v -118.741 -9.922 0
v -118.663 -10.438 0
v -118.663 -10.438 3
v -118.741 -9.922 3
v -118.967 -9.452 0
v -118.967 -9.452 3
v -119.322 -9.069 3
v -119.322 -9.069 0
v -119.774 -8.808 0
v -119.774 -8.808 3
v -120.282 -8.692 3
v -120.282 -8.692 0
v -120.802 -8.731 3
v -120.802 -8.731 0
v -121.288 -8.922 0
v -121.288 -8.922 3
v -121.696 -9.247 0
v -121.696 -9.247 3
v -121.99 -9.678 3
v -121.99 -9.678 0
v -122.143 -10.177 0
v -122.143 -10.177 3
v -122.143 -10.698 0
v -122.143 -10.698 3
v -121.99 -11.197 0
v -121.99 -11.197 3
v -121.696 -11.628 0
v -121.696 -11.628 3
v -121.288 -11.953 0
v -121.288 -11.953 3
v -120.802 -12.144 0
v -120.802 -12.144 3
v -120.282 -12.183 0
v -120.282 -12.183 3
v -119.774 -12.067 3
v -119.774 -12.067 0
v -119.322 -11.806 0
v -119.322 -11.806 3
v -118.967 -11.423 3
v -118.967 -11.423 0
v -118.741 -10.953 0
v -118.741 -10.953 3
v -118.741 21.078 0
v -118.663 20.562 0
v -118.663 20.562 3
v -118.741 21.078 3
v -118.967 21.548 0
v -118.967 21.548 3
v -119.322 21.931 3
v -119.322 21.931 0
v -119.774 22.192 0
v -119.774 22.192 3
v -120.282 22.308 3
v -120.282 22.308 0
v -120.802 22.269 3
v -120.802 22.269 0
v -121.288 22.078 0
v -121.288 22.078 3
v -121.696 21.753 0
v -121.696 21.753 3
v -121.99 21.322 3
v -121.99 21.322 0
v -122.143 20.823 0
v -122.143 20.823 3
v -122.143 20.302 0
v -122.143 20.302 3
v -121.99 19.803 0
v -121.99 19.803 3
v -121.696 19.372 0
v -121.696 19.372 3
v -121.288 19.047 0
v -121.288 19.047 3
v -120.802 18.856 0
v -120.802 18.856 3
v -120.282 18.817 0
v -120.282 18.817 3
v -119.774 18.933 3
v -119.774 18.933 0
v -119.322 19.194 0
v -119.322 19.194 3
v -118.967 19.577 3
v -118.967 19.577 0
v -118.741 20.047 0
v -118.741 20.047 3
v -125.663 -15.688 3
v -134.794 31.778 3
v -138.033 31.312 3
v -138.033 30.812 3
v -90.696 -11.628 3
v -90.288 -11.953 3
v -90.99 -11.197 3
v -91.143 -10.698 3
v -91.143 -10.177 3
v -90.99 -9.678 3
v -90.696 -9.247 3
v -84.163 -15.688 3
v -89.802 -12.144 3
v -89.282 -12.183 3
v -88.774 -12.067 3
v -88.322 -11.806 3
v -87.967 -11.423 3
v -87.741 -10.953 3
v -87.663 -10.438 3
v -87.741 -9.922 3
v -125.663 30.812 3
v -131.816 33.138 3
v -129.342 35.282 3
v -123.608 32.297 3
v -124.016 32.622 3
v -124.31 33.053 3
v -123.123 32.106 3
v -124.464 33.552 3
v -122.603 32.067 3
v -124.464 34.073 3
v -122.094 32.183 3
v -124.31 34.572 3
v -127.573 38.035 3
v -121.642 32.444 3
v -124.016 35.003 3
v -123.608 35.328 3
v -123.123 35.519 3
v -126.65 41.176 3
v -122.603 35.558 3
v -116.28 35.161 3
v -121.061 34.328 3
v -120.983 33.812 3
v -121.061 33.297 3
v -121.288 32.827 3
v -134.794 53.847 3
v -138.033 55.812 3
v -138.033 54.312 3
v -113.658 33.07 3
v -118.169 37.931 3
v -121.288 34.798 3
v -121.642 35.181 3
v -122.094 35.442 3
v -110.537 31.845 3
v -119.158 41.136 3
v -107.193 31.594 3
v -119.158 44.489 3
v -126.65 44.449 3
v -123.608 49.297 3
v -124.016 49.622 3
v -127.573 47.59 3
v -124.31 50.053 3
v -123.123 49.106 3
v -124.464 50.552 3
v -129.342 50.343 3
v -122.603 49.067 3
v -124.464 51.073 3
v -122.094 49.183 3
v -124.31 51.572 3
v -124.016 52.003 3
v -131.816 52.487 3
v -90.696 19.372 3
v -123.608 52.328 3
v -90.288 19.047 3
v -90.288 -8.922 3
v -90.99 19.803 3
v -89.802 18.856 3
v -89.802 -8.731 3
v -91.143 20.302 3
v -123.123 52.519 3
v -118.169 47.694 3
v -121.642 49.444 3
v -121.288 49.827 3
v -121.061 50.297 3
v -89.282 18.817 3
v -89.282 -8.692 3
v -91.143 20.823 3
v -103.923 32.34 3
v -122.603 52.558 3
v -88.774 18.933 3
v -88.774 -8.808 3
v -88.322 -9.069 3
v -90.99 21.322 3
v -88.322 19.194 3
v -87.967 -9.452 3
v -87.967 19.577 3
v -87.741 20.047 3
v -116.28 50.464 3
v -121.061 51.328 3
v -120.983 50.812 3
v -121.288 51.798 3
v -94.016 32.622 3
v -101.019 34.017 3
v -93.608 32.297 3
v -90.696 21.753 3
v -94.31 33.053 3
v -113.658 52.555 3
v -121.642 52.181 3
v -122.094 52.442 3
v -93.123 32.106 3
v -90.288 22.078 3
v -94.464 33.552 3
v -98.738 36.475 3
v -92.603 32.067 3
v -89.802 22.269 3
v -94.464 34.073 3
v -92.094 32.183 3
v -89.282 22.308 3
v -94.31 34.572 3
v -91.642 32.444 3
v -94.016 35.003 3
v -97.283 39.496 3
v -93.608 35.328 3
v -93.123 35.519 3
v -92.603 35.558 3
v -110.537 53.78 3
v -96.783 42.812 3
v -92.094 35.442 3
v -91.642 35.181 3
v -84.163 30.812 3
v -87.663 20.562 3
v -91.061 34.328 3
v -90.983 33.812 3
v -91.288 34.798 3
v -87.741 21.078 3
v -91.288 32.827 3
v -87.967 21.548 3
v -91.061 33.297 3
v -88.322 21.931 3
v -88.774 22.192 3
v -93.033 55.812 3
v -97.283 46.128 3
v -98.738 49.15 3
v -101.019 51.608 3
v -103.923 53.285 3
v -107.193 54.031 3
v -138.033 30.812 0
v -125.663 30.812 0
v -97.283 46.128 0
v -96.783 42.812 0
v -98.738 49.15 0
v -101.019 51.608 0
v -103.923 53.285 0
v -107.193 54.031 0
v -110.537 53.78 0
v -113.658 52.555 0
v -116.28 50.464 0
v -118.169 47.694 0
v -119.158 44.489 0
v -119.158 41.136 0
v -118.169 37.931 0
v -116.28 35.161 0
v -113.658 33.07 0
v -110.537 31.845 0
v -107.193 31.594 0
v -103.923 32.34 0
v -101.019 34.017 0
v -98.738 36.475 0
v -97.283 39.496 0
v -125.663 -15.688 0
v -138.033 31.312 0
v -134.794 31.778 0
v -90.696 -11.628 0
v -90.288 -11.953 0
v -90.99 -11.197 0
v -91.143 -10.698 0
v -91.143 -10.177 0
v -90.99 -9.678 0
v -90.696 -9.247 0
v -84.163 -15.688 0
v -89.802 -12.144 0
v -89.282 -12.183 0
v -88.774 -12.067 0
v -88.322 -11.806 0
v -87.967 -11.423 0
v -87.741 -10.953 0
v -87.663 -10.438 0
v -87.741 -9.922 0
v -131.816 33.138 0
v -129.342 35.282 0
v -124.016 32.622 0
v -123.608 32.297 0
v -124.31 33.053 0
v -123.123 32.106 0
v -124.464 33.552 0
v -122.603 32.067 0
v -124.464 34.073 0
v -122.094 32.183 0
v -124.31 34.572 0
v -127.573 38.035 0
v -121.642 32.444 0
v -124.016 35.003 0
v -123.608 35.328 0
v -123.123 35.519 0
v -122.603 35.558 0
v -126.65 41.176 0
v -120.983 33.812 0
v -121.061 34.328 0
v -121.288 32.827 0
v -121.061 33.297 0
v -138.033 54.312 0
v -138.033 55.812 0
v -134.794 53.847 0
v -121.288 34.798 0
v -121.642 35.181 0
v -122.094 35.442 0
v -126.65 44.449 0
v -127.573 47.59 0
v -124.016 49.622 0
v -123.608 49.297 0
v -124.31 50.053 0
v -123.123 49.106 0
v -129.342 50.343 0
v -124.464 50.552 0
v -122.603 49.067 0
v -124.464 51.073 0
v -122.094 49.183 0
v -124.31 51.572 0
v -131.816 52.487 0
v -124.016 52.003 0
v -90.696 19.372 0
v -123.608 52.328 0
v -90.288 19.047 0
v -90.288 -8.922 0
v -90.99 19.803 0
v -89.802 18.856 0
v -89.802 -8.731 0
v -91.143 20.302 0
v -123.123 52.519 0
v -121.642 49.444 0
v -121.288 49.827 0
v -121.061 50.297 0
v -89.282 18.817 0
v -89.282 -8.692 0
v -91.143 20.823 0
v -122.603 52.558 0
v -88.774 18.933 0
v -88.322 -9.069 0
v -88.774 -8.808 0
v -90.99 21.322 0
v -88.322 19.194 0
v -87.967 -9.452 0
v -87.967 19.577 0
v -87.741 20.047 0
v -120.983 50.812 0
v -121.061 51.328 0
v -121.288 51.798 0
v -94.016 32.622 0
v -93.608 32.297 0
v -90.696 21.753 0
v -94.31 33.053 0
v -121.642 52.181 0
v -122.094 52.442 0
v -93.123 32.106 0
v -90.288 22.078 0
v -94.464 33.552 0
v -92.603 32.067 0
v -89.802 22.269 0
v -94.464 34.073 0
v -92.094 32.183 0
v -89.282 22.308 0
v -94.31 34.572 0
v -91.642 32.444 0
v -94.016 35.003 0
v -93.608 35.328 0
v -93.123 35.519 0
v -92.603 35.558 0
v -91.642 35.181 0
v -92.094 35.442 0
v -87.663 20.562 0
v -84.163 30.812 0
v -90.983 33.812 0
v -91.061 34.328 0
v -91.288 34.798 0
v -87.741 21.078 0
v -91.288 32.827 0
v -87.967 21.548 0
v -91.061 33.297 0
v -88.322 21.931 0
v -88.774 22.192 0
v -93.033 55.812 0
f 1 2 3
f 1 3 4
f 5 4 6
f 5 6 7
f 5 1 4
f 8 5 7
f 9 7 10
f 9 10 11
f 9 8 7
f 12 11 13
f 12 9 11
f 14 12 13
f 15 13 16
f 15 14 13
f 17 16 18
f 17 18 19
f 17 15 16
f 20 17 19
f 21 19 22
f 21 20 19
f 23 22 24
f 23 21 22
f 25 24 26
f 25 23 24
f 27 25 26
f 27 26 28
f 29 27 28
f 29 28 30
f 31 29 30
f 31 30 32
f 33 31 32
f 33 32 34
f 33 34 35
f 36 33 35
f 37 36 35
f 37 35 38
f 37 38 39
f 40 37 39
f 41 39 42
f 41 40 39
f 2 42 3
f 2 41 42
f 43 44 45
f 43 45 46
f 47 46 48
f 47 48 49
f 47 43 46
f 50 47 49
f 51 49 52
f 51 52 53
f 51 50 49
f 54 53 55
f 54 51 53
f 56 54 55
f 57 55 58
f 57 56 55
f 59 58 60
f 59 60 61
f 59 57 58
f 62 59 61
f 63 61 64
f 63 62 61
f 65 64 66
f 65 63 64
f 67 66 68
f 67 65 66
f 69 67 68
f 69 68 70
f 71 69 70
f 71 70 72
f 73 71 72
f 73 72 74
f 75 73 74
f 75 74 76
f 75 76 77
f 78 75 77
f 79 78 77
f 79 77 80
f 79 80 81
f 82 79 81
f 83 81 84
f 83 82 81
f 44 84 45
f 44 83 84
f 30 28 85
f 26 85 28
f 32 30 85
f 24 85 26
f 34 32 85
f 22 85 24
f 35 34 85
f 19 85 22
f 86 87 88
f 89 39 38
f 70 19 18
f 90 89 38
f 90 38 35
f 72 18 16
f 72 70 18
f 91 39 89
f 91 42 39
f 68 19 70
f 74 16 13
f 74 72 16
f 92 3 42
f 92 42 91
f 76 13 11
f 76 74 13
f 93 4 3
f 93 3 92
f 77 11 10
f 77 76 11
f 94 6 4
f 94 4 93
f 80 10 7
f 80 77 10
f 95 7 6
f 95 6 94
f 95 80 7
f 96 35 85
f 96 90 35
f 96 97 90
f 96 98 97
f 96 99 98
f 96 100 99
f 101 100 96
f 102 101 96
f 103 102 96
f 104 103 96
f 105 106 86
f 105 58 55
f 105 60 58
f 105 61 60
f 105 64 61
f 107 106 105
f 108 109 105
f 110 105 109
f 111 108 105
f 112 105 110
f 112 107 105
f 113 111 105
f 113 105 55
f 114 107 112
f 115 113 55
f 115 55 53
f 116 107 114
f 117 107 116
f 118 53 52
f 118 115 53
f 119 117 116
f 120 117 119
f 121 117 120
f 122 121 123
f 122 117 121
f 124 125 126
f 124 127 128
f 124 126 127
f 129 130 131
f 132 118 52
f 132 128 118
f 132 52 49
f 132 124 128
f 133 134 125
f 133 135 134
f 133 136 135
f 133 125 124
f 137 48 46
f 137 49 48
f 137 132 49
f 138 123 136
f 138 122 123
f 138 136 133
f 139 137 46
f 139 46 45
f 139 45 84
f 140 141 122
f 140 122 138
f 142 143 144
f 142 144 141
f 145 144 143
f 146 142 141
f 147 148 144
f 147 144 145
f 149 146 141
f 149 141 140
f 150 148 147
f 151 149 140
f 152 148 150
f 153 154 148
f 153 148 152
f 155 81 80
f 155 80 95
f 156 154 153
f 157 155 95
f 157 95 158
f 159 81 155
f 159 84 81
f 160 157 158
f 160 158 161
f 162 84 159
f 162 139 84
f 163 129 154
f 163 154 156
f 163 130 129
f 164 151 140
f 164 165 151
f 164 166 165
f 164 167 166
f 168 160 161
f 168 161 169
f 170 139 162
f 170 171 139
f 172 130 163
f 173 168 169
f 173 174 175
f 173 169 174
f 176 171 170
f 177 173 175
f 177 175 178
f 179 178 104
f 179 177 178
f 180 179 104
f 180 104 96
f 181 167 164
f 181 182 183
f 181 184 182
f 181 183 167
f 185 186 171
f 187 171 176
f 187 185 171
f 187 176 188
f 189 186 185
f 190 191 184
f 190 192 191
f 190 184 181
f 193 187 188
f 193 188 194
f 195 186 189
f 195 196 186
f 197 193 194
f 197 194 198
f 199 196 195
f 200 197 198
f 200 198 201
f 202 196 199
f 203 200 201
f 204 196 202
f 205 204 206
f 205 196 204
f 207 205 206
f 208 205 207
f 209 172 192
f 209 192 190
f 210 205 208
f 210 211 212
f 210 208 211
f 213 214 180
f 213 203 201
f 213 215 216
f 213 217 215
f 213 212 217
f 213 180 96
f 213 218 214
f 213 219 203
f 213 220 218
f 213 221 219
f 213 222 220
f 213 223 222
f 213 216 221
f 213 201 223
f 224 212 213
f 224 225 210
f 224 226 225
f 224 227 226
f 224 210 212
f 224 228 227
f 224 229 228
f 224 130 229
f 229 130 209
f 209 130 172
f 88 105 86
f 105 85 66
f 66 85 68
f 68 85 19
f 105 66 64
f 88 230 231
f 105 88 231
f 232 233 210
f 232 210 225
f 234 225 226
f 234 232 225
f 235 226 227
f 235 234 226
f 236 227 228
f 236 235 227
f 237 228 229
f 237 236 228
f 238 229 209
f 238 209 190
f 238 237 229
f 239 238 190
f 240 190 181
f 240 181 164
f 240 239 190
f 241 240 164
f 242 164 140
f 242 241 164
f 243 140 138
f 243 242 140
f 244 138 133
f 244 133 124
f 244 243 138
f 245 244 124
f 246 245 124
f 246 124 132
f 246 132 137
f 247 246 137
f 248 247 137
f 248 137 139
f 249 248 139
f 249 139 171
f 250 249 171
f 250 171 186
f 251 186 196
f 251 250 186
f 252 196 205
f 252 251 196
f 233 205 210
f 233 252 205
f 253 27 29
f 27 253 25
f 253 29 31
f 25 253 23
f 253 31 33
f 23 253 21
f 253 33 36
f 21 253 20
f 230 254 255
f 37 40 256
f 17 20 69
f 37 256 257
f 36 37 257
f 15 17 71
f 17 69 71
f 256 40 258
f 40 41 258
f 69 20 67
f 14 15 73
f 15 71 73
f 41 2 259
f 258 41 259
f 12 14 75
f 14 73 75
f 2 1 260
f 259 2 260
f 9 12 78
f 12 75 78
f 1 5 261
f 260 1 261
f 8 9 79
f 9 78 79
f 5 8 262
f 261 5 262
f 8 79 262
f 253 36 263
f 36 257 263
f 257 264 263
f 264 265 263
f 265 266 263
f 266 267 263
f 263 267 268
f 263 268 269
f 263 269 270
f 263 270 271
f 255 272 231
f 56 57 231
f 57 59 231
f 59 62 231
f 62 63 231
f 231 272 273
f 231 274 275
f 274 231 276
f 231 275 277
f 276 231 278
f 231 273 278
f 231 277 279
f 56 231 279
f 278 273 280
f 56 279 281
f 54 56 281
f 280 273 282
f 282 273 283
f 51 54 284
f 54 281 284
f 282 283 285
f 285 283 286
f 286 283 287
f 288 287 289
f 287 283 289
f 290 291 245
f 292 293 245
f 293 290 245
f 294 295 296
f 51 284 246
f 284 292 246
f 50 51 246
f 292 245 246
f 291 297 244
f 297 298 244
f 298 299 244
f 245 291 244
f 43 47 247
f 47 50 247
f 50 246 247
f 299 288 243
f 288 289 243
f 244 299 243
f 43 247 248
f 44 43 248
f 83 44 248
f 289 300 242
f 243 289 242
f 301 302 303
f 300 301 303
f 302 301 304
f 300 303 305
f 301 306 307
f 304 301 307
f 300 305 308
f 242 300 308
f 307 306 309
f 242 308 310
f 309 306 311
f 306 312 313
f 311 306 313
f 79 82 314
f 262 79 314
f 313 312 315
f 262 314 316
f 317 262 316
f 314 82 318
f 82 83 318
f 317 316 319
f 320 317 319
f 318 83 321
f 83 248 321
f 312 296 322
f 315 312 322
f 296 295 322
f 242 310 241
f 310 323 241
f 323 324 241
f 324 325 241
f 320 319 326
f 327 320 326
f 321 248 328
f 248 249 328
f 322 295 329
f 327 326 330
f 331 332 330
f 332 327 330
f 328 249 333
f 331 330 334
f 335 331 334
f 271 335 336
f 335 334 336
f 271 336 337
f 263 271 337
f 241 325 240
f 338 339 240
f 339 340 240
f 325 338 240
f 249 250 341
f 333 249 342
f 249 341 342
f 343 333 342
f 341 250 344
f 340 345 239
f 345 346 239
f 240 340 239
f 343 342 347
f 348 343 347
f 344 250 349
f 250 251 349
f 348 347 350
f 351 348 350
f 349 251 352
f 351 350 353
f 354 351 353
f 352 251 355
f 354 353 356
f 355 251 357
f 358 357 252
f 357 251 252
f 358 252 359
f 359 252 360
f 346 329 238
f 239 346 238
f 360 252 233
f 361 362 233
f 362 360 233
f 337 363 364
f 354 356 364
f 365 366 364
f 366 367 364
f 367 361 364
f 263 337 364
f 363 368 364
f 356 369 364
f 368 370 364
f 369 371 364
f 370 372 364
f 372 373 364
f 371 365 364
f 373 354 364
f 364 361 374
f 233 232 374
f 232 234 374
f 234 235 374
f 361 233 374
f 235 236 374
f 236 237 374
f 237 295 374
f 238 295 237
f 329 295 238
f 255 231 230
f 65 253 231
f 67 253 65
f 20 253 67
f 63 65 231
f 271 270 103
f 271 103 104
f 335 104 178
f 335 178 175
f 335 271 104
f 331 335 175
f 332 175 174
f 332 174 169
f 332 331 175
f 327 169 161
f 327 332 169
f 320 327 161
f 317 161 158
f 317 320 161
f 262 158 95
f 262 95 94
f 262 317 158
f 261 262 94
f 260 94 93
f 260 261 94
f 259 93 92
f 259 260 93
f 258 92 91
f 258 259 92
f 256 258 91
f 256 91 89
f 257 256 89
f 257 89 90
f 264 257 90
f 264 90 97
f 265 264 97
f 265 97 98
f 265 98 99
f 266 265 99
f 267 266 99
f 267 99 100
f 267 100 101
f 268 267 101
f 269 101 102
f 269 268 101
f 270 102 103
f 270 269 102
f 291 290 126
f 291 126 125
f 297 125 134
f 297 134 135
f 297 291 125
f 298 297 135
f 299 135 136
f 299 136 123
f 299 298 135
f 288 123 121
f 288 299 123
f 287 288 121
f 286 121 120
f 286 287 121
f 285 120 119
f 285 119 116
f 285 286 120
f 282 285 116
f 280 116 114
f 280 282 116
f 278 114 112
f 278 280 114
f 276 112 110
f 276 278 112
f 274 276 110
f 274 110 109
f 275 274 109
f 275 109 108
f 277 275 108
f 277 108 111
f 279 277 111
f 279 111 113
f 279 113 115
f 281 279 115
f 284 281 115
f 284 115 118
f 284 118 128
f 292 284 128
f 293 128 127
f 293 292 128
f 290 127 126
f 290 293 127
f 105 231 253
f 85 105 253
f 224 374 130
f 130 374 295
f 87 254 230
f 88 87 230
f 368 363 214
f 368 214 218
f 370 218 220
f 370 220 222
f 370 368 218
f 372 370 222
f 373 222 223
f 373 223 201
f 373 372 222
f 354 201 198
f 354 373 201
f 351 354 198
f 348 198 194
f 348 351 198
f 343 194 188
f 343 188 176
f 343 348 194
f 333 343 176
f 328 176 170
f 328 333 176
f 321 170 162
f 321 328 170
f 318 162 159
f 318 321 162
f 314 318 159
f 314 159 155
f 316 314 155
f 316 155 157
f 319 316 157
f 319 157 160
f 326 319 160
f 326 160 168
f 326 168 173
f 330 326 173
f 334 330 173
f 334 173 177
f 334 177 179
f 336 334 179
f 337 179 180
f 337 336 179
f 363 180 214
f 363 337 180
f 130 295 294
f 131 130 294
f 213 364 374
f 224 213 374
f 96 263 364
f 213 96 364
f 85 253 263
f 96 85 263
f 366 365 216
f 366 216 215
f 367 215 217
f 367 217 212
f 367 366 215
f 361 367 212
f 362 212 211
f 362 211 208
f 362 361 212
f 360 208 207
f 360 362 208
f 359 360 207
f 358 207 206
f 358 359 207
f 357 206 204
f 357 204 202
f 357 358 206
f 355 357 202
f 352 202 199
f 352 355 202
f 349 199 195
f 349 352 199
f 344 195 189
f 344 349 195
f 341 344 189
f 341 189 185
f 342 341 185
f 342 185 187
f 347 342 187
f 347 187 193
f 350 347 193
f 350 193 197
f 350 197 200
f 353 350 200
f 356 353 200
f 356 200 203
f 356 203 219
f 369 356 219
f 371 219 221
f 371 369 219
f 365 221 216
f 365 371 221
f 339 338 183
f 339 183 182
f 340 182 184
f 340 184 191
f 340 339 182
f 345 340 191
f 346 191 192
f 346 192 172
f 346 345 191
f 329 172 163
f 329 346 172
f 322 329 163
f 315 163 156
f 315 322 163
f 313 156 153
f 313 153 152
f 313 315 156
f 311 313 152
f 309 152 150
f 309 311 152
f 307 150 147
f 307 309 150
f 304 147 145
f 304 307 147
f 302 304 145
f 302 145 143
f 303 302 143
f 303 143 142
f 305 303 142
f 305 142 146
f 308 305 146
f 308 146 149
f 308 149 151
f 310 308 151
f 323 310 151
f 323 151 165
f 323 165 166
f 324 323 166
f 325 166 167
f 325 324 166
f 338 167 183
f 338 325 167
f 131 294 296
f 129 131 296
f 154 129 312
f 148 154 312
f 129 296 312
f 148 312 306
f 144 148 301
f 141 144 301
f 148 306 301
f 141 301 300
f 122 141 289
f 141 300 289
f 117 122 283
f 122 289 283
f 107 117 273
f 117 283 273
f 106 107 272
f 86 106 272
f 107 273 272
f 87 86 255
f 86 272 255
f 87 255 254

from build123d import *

# Parameters (mm, degrees)
SKETCH1_R           = 11.25
SKETCH1_R_2         = 1.75
BOSS_EXTRUDE1_DEPTH = 3


with BuildPart() as part:
    # Sketch1 → Boss-Extrude1 (new body)
    with BuildSketch(Plane.XY):
        with BuildLine():
            Line((-125.662997175, -15.687527708), (-84.162997175, -15.687527708))
            Line((-84.162997175, -15.687527708), (-84.162997175, 25.812472292))
            Line((-84.162997175, 25.812472292), (-84.162997175, 30.812472292))
            Line((-84.162997175, 30.812472292), (-93.033440026, 55.812472292))
            Line((-93.033440026, 55.812472292), (-138.033440026, 55.812472292))
            Line((-138.033440026, 55.812472292), (-138.033440026, 54.312472292))
            ThreePointArc((-138.033440026, 54.312472292), (-126.533440026, 42.812472292), (-138.033440026, 31.312472292))
            Line((-138.033440026, 31.312472292), (-138.033440026, 30.812472292))
            Line((-138.033440026, 30.812472292), (-125.662997175, 30.812472292))
            Line((-125.662997175, 30.812472292), (-125.662997175, 25.812472292))
            Line((-125.662997175, 25.812472292), (-125.662997175, -15.687527708))
        make_face()
        with Locations((-108.033440026, 42.812472292)):
            Circle(SKETCH1_R, mode=Mode.SUBTRACT)
        with Locations((-89.412997175, 20.562472292)):
            Circle(SKETCH1_R_2, mode=Mode.SUBTRACT)
        with Locations((-120.412997175, 20.562472292)):
            Circle(SKETCH1_R_2, mode=Mode.SUBTRACT)
        with Locations((-120.412997175, -10.437527708)):
            Circle(SKETCH1_R_2, mode=Mode.SUBTRACT)
        with Locations((-89.412997175, -10.437527708)):
            Circle(SKETCH1_R_2, mode=Mode.SUBTRACT)
        with Locations((-122.733440026, 50.812472292)):
            Circle(SKETCH1_R_2, mode=Mode.SUBTRACT)
        with Locations((-122.733440026, 33.812472292)):
            Circle(SKETCH1_R_2, mode=Mode.SUBTRACT)
        with Locations((-92.733440026, 33.812472292)):
            Circle(SKETCH1_R_2, mode=Mode.SUBTRACT)
    extrude(amount=BOSS_EXTRUDE1_DEPTH)


solid = part.part
